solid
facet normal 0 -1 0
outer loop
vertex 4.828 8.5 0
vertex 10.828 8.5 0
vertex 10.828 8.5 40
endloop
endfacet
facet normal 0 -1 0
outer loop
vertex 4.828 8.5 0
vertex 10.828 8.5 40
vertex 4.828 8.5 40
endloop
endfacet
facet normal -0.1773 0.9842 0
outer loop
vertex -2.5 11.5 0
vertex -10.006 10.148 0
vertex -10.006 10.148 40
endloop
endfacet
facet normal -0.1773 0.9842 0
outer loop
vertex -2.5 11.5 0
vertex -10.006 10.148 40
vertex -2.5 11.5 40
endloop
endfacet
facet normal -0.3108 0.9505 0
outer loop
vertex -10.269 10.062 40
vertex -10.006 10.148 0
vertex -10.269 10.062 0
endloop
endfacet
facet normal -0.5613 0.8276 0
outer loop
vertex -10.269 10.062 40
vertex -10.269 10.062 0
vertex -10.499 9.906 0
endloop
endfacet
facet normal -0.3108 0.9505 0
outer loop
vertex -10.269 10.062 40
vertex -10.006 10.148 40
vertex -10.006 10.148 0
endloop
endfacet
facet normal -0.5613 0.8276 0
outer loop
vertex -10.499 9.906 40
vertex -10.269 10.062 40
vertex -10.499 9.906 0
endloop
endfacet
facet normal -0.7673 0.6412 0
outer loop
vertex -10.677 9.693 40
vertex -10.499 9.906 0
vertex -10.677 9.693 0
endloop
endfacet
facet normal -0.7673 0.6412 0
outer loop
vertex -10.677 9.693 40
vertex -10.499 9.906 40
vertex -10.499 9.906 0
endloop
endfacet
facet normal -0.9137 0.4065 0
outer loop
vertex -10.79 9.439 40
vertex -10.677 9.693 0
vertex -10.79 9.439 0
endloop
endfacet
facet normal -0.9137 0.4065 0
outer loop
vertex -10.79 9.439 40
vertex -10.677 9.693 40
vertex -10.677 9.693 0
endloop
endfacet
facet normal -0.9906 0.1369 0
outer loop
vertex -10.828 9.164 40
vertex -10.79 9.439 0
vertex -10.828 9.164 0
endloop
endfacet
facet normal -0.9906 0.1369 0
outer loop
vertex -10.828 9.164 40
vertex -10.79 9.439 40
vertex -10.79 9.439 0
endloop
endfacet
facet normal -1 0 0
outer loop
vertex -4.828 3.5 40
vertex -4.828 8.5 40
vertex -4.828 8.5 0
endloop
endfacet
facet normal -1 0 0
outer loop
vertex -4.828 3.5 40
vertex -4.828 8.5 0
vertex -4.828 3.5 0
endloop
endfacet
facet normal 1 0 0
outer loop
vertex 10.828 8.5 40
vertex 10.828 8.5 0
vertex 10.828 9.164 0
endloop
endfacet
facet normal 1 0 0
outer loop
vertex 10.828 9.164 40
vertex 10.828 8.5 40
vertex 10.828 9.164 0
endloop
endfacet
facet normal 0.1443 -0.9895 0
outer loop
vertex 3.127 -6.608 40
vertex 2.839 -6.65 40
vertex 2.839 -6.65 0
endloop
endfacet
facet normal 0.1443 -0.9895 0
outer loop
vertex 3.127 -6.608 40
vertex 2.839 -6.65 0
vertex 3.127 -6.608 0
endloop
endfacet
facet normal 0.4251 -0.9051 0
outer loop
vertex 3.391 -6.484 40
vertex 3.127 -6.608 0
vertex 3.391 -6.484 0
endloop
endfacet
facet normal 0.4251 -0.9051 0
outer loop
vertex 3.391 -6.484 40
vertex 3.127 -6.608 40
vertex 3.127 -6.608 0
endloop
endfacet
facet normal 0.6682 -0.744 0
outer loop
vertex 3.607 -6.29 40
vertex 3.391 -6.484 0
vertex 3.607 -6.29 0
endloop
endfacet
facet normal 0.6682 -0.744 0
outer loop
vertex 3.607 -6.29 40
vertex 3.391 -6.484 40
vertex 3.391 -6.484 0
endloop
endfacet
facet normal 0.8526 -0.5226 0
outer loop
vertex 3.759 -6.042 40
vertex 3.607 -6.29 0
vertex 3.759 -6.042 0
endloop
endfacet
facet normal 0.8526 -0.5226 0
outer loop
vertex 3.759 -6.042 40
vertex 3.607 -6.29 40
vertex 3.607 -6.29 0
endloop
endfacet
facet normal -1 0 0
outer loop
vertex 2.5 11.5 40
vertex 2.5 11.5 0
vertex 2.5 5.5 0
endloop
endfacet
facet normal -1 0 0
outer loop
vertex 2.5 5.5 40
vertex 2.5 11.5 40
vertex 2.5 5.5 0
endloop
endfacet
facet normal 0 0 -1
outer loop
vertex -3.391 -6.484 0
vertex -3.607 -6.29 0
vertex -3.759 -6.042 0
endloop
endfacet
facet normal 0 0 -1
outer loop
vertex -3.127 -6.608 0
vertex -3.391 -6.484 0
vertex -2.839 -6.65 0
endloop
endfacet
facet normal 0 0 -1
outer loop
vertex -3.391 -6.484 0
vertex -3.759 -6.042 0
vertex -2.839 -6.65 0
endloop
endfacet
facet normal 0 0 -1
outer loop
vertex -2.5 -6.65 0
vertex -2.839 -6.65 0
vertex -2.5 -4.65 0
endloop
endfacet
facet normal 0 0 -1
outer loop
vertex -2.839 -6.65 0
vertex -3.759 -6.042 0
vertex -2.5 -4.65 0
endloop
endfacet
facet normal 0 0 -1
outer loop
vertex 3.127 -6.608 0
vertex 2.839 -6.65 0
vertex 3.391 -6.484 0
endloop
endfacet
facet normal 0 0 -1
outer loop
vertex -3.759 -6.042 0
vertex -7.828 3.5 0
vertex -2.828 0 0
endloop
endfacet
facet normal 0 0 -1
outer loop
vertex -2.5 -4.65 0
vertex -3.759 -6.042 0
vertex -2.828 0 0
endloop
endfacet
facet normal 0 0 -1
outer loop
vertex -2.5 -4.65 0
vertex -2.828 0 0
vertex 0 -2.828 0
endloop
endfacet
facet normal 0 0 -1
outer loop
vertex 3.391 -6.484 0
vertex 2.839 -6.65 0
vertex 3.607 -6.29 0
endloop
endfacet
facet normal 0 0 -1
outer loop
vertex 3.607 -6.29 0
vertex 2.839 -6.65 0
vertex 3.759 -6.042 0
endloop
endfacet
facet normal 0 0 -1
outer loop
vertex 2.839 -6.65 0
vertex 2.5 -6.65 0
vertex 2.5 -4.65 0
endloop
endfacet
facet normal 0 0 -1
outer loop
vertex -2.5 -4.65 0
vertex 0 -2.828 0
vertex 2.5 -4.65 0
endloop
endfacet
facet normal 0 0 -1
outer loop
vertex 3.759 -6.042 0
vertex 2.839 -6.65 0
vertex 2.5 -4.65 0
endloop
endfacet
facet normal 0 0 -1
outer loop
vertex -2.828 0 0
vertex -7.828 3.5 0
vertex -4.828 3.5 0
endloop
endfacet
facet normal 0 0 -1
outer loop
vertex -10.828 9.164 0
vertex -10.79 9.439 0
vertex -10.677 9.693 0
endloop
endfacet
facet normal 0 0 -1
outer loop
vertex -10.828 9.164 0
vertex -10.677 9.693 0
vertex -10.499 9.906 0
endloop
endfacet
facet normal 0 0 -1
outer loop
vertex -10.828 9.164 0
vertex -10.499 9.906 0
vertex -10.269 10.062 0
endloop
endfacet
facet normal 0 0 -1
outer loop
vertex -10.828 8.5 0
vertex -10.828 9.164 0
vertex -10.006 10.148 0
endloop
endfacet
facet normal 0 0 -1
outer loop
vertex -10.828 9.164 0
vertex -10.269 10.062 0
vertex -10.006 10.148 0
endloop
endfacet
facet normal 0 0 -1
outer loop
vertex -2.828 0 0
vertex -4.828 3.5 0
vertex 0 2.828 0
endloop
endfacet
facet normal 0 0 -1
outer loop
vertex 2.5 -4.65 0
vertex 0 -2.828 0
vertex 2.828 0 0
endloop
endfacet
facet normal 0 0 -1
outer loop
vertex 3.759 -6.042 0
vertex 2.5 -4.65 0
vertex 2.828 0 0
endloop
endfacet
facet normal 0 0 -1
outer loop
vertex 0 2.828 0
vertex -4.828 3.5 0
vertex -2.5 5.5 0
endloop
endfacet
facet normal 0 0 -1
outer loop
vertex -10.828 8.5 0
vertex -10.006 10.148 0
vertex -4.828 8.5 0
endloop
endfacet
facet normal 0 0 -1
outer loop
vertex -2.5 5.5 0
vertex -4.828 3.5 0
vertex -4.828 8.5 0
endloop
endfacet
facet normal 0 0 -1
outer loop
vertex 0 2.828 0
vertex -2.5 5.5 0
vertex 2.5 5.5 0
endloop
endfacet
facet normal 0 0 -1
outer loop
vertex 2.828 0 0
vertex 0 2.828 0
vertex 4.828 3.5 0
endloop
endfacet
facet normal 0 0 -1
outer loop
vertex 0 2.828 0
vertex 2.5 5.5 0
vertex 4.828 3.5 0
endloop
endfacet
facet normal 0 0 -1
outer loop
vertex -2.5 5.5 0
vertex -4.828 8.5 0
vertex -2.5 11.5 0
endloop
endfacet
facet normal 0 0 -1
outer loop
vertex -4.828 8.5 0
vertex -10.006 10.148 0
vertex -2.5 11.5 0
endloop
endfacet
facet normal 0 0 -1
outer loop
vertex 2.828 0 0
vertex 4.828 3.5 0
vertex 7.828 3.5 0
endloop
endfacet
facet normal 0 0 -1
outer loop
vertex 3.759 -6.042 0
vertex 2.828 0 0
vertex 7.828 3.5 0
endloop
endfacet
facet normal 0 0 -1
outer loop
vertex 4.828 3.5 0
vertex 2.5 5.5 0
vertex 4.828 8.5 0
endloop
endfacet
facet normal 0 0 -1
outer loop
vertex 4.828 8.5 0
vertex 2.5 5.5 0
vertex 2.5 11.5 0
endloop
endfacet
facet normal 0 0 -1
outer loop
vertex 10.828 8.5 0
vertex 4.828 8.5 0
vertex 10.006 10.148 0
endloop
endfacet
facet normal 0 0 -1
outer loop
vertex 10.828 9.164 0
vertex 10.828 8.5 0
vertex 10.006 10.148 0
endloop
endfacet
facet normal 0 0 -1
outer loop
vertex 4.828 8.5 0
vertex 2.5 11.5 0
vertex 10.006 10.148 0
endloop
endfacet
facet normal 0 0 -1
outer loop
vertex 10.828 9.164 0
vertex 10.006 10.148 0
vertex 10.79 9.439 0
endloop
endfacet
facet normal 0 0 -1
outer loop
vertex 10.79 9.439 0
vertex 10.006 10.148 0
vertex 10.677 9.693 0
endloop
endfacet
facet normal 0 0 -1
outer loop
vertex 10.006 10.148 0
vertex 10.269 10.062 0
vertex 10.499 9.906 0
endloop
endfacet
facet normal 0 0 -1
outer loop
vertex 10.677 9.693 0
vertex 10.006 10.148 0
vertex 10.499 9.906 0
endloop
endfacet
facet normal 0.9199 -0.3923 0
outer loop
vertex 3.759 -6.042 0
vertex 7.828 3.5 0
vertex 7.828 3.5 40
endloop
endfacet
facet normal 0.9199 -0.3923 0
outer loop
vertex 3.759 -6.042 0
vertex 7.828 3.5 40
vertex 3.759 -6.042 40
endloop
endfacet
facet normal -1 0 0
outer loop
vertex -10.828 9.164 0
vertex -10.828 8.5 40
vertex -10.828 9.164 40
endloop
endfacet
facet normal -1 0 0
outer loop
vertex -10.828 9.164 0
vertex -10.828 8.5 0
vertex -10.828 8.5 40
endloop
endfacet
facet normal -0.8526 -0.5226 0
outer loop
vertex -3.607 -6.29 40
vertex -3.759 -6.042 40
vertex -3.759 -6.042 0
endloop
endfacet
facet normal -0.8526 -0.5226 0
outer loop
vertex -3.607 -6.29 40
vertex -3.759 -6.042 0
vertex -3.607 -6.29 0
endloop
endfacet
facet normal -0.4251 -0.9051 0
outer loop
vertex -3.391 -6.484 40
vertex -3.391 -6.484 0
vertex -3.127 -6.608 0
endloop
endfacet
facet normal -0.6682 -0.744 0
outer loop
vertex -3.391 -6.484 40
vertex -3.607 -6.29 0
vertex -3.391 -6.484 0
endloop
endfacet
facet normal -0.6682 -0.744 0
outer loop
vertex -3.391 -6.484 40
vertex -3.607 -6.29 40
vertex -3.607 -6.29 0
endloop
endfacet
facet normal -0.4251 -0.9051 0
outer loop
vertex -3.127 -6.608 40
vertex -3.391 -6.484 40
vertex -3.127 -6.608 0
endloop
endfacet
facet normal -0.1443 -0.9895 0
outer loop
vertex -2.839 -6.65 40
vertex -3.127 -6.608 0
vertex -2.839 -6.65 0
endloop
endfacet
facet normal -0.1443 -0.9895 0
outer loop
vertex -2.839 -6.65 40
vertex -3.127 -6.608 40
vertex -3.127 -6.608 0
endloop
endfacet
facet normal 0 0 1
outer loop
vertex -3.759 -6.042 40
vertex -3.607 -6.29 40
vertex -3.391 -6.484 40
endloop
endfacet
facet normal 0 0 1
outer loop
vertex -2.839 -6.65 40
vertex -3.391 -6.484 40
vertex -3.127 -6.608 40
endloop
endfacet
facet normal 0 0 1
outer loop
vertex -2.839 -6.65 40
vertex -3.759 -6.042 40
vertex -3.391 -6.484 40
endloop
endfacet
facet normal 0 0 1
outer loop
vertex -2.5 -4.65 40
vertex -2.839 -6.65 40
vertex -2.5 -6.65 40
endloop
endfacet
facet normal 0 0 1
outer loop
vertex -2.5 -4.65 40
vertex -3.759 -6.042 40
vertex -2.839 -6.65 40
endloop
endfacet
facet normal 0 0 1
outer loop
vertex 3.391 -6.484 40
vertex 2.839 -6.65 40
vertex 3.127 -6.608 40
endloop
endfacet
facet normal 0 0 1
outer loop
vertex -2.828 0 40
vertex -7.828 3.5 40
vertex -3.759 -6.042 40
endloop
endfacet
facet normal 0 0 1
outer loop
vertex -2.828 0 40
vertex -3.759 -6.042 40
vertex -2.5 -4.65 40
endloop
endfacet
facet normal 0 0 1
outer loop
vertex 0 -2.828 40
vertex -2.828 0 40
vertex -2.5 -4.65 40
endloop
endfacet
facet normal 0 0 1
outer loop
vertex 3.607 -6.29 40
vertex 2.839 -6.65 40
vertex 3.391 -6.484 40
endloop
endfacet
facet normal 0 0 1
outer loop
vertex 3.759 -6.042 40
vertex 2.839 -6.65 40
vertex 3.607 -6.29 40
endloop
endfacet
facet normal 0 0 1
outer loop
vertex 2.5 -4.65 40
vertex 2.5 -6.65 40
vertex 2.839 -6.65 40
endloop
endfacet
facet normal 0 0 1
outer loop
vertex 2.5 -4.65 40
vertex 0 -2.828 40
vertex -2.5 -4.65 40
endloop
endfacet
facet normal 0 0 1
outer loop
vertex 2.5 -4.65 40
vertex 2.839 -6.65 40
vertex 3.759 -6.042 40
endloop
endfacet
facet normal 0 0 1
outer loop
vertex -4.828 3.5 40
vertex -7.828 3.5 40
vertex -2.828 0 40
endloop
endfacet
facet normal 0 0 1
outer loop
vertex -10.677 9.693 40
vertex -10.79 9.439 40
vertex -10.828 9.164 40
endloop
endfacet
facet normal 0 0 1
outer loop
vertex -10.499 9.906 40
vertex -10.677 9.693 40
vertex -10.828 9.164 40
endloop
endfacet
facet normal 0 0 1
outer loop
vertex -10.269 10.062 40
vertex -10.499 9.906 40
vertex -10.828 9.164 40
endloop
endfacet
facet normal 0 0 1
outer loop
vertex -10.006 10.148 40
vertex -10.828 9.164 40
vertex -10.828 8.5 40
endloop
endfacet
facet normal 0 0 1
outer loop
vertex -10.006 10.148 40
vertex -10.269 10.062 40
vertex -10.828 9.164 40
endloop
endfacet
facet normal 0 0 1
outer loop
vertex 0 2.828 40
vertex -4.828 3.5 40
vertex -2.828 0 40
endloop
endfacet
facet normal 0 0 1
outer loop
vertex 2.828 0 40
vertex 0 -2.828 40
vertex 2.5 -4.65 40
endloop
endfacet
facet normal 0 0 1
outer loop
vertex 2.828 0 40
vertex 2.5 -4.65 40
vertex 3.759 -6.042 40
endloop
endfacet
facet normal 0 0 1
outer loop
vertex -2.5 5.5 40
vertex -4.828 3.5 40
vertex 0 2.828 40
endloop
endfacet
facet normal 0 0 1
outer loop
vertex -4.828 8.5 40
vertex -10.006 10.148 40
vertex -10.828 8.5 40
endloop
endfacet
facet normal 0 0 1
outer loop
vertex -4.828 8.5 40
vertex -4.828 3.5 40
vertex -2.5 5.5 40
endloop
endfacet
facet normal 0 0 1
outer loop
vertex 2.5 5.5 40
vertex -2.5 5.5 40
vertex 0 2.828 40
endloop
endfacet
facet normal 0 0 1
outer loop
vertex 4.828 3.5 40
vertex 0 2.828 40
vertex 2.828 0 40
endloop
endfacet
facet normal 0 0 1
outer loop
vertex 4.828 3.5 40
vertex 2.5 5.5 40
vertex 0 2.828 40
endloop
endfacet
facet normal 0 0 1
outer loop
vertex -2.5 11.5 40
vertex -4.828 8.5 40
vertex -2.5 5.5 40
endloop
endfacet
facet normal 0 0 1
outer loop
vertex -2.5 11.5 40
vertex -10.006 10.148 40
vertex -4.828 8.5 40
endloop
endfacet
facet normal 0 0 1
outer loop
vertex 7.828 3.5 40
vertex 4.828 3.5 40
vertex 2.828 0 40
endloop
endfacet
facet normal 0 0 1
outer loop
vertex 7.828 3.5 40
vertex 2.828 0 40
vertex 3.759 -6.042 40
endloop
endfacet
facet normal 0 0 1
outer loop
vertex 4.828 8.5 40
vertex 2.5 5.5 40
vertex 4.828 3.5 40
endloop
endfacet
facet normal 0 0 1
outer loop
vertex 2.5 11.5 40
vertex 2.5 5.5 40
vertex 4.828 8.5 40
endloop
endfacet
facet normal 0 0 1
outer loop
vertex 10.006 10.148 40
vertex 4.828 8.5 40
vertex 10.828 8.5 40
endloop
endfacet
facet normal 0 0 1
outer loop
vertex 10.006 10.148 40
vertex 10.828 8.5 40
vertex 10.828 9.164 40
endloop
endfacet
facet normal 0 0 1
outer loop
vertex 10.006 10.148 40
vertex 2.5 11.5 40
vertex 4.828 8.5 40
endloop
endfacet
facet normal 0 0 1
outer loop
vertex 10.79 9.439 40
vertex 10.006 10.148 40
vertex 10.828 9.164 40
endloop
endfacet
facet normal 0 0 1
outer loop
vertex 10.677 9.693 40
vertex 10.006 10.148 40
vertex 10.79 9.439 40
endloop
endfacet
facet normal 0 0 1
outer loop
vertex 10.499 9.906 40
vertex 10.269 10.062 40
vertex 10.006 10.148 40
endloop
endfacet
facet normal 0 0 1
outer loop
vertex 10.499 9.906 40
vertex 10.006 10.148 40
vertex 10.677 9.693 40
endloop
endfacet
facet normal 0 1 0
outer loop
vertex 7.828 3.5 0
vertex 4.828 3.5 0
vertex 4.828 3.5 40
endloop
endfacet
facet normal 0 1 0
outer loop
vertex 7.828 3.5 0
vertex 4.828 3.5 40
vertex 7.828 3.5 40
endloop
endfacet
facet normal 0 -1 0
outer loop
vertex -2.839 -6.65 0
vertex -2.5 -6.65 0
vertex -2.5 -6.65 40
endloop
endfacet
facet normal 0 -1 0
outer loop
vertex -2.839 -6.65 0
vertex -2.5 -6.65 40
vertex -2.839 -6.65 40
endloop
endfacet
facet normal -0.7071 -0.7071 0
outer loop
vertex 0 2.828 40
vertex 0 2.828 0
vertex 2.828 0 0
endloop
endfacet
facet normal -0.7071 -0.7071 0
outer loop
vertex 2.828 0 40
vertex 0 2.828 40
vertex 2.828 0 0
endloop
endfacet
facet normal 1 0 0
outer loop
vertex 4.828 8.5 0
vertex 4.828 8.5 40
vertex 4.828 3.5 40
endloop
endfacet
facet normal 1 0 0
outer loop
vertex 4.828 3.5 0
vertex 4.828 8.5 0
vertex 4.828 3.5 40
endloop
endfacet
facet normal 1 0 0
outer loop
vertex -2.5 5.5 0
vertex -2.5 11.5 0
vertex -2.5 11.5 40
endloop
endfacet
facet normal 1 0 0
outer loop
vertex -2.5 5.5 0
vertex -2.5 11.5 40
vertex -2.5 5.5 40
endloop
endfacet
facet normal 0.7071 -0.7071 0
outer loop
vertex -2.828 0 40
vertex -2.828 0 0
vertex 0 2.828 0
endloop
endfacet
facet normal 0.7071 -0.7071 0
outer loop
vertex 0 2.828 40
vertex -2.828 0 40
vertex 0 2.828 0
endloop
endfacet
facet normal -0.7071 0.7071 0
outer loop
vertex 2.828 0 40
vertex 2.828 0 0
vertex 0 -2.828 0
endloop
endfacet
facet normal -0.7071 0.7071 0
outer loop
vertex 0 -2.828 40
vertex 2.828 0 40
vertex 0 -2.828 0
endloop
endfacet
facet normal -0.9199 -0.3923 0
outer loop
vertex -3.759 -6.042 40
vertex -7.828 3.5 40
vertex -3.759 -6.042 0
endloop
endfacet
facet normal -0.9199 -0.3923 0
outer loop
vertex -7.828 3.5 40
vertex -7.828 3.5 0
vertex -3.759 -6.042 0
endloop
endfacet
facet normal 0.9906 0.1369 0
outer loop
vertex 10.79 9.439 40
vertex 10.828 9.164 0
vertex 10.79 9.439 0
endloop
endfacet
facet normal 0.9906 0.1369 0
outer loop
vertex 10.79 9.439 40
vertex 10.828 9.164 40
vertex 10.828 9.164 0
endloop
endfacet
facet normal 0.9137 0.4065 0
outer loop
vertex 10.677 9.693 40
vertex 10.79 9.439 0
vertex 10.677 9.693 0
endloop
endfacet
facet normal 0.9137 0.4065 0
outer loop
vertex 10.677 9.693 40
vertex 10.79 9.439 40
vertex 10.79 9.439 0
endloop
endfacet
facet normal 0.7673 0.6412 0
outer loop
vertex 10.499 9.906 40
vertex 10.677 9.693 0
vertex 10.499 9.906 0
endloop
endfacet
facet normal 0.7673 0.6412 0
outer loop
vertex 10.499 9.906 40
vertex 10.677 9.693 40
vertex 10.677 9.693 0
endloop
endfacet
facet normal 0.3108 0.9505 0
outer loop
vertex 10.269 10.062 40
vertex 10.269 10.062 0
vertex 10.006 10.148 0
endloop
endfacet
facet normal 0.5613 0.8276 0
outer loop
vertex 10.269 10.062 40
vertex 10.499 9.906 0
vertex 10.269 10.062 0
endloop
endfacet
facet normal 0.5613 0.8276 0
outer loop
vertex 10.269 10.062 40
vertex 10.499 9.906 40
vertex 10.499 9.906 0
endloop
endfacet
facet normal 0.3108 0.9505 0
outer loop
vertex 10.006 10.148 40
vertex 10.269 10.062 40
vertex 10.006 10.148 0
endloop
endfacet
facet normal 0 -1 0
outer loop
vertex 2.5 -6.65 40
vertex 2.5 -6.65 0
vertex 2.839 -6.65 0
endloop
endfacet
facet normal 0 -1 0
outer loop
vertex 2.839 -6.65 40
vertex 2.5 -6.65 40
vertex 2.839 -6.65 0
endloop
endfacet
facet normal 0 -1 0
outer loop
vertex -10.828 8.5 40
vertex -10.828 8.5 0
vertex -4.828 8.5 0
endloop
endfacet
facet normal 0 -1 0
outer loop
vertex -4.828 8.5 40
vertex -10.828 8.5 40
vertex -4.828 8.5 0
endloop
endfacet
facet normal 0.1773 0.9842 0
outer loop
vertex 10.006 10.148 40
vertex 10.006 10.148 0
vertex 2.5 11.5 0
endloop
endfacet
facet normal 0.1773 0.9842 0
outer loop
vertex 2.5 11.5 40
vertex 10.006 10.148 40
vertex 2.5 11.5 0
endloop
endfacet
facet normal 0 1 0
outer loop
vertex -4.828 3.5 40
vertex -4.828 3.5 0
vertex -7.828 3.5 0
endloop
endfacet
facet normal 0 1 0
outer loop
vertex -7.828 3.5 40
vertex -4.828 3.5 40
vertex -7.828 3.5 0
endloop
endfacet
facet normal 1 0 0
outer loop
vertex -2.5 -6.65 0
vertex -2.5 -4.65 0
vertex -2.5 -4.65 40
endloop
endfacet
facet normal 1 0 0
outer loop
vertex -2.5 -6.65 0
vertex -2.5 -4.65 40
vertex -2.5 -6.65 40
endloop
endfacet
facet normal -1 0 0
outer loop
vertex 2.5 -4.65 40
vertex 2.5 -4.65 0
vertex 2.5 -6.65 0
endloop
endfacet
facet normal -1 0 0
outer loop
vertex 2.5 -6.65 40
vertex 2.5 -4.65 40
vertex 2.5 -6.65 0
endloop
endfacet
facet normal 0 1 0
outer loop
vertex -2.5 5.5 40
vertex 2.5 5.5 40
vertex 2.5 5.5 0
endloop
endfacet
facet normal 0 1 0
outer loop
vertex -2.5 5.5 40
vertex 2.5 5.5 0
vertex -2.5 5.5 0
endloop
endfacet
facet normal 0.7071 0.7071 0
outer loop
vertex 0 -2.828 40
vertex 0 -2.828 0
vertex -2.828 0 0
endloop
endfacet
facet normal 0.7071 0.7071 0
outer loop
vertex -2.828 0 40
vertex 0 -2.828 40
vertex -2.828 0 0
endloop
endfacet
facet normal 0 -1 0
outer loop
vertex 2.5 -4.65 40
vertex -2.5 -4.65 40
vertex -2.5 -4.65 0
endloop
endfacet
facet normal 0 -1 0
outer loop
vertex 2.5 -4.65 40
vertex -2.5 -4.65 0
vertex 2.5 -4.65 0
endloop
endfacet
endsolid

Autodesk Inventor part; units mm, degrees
ref_plane "YZ Plane" through (0, 0, 0) normal (1, 0, 0) x (0, 1, 0)
ref_plane "XZ Plane" through (0, 0, 0) normal (0, 1, 0) x (-1, 0, 0)
ref_plane "XY Plane" through (0, 0, 0) normal (0, 0, 1) x (1, 0, 0)
sketch "スケッチ1" plane through (0, 0, 0) normal (0, 0, 1) x (1, 0, 0)
  line L0 (0, 18.2674) -> (0, -9.7942)
  line L1 (0, -4.65) -> (-2.5, -4.65)
  line L2 (-2.5, -4.65) -> (-2.5, -6.65)
  line L3 (-2.5, -6.65) -> (-3.5, -6.65)
  line L4 (-10.8284, 8.5) -> (-4.8284, 8.5)
  line L5 (-4.8284, 8.5) -> (-4.8284, 3.5)
  line L6 (-4.8284, 3.5) -> (-7.8284, 3.5)
  line L7 (-7.8284, 3.5) -> (-3.5, -6.65)
  line L8 (-10.8284, 8.5) -> (-10.8284, 10)
  line L9 (-10.8284, 10) -> (-2.5, 11.5)
  line L10 (-2.5, 11.5) -> (-2.5, 5.5)
  line L11 (-2.5, 5.5) -> (0, 5.5)
  line L12 (0, -4.65) -> (2.5, -4.65)
  line L13 (2.5, -4.65) -> (2.5, -6.65)
  line L14 (2.5, -6.65) -> (3.5, -6.65)
  line L15 (10.8284, 8.5) -> (4.8284, 8.5)
  line L16 (4.8284, 8.5) -> (4.8284, 3.5)
  line L17 (4.8284, 3.5) -> (7.8284, 3.5)
  line L18 (7.8284, 3.5) -> (3.5, -6.65)
  line L19 (10.8284, 8.5) -> (10.8284, 10)
  line L20 (10.8284, 10) -> (2.5, 11.5)
  line L21 (2.5, 11.5) -> (2.5, 5.5)
  line L22 (2.5, 5.5) -> (0, 5.5)
  line L23 (-2.8284, 0) -> (0, 2.8284)
  line L24 (0, 2.8284) -> (2.8284, 0)
  line L25 (2.8284, 0) -> (0, -2.8284)
  line L26 (0, -2.8284) -> (-2.8284, 0)
  point P0 (0, 0)
  point P1 (0, 3.5)
  point P2 (0, -2.65)
  point P3 (2.8284, 0)
  dimension "d23" = 2
  dimension "d31" = 1
  dimension "d33" = 2
  dimension "d34" = 6
  dimension "d35" = 3
  dimension "d39" = 5
  dimension "d41" = 3
  dimension "d42" = 5
  dimension "d43" = 5
  dimension "d44" = 2
  dimension "d45" = 1.5
  dimension "d46" = 2
  dimension "d50" = 4
  dimension "d51" = 3.5
extrude "押し出し1" add sketch "スケッチ1" along normal blind 40 contours L22 L21 L20 L19 L15 L16 L17 L18 L14 L13 L12 L0 L25 L24 | L0 L23 L26 L1 L2 L3 L7 L6 L5 L4 L8 L9 L10 L11
fillet "フィレット2" radius 1 4 edges at (-3.5, -6.65, 20) (3.5, -6.65, 20) (10.8284, 10, 20) (-10.8284, 10, 20)
properties part number "TailRod_N_o" material "ABS プラスチック"
